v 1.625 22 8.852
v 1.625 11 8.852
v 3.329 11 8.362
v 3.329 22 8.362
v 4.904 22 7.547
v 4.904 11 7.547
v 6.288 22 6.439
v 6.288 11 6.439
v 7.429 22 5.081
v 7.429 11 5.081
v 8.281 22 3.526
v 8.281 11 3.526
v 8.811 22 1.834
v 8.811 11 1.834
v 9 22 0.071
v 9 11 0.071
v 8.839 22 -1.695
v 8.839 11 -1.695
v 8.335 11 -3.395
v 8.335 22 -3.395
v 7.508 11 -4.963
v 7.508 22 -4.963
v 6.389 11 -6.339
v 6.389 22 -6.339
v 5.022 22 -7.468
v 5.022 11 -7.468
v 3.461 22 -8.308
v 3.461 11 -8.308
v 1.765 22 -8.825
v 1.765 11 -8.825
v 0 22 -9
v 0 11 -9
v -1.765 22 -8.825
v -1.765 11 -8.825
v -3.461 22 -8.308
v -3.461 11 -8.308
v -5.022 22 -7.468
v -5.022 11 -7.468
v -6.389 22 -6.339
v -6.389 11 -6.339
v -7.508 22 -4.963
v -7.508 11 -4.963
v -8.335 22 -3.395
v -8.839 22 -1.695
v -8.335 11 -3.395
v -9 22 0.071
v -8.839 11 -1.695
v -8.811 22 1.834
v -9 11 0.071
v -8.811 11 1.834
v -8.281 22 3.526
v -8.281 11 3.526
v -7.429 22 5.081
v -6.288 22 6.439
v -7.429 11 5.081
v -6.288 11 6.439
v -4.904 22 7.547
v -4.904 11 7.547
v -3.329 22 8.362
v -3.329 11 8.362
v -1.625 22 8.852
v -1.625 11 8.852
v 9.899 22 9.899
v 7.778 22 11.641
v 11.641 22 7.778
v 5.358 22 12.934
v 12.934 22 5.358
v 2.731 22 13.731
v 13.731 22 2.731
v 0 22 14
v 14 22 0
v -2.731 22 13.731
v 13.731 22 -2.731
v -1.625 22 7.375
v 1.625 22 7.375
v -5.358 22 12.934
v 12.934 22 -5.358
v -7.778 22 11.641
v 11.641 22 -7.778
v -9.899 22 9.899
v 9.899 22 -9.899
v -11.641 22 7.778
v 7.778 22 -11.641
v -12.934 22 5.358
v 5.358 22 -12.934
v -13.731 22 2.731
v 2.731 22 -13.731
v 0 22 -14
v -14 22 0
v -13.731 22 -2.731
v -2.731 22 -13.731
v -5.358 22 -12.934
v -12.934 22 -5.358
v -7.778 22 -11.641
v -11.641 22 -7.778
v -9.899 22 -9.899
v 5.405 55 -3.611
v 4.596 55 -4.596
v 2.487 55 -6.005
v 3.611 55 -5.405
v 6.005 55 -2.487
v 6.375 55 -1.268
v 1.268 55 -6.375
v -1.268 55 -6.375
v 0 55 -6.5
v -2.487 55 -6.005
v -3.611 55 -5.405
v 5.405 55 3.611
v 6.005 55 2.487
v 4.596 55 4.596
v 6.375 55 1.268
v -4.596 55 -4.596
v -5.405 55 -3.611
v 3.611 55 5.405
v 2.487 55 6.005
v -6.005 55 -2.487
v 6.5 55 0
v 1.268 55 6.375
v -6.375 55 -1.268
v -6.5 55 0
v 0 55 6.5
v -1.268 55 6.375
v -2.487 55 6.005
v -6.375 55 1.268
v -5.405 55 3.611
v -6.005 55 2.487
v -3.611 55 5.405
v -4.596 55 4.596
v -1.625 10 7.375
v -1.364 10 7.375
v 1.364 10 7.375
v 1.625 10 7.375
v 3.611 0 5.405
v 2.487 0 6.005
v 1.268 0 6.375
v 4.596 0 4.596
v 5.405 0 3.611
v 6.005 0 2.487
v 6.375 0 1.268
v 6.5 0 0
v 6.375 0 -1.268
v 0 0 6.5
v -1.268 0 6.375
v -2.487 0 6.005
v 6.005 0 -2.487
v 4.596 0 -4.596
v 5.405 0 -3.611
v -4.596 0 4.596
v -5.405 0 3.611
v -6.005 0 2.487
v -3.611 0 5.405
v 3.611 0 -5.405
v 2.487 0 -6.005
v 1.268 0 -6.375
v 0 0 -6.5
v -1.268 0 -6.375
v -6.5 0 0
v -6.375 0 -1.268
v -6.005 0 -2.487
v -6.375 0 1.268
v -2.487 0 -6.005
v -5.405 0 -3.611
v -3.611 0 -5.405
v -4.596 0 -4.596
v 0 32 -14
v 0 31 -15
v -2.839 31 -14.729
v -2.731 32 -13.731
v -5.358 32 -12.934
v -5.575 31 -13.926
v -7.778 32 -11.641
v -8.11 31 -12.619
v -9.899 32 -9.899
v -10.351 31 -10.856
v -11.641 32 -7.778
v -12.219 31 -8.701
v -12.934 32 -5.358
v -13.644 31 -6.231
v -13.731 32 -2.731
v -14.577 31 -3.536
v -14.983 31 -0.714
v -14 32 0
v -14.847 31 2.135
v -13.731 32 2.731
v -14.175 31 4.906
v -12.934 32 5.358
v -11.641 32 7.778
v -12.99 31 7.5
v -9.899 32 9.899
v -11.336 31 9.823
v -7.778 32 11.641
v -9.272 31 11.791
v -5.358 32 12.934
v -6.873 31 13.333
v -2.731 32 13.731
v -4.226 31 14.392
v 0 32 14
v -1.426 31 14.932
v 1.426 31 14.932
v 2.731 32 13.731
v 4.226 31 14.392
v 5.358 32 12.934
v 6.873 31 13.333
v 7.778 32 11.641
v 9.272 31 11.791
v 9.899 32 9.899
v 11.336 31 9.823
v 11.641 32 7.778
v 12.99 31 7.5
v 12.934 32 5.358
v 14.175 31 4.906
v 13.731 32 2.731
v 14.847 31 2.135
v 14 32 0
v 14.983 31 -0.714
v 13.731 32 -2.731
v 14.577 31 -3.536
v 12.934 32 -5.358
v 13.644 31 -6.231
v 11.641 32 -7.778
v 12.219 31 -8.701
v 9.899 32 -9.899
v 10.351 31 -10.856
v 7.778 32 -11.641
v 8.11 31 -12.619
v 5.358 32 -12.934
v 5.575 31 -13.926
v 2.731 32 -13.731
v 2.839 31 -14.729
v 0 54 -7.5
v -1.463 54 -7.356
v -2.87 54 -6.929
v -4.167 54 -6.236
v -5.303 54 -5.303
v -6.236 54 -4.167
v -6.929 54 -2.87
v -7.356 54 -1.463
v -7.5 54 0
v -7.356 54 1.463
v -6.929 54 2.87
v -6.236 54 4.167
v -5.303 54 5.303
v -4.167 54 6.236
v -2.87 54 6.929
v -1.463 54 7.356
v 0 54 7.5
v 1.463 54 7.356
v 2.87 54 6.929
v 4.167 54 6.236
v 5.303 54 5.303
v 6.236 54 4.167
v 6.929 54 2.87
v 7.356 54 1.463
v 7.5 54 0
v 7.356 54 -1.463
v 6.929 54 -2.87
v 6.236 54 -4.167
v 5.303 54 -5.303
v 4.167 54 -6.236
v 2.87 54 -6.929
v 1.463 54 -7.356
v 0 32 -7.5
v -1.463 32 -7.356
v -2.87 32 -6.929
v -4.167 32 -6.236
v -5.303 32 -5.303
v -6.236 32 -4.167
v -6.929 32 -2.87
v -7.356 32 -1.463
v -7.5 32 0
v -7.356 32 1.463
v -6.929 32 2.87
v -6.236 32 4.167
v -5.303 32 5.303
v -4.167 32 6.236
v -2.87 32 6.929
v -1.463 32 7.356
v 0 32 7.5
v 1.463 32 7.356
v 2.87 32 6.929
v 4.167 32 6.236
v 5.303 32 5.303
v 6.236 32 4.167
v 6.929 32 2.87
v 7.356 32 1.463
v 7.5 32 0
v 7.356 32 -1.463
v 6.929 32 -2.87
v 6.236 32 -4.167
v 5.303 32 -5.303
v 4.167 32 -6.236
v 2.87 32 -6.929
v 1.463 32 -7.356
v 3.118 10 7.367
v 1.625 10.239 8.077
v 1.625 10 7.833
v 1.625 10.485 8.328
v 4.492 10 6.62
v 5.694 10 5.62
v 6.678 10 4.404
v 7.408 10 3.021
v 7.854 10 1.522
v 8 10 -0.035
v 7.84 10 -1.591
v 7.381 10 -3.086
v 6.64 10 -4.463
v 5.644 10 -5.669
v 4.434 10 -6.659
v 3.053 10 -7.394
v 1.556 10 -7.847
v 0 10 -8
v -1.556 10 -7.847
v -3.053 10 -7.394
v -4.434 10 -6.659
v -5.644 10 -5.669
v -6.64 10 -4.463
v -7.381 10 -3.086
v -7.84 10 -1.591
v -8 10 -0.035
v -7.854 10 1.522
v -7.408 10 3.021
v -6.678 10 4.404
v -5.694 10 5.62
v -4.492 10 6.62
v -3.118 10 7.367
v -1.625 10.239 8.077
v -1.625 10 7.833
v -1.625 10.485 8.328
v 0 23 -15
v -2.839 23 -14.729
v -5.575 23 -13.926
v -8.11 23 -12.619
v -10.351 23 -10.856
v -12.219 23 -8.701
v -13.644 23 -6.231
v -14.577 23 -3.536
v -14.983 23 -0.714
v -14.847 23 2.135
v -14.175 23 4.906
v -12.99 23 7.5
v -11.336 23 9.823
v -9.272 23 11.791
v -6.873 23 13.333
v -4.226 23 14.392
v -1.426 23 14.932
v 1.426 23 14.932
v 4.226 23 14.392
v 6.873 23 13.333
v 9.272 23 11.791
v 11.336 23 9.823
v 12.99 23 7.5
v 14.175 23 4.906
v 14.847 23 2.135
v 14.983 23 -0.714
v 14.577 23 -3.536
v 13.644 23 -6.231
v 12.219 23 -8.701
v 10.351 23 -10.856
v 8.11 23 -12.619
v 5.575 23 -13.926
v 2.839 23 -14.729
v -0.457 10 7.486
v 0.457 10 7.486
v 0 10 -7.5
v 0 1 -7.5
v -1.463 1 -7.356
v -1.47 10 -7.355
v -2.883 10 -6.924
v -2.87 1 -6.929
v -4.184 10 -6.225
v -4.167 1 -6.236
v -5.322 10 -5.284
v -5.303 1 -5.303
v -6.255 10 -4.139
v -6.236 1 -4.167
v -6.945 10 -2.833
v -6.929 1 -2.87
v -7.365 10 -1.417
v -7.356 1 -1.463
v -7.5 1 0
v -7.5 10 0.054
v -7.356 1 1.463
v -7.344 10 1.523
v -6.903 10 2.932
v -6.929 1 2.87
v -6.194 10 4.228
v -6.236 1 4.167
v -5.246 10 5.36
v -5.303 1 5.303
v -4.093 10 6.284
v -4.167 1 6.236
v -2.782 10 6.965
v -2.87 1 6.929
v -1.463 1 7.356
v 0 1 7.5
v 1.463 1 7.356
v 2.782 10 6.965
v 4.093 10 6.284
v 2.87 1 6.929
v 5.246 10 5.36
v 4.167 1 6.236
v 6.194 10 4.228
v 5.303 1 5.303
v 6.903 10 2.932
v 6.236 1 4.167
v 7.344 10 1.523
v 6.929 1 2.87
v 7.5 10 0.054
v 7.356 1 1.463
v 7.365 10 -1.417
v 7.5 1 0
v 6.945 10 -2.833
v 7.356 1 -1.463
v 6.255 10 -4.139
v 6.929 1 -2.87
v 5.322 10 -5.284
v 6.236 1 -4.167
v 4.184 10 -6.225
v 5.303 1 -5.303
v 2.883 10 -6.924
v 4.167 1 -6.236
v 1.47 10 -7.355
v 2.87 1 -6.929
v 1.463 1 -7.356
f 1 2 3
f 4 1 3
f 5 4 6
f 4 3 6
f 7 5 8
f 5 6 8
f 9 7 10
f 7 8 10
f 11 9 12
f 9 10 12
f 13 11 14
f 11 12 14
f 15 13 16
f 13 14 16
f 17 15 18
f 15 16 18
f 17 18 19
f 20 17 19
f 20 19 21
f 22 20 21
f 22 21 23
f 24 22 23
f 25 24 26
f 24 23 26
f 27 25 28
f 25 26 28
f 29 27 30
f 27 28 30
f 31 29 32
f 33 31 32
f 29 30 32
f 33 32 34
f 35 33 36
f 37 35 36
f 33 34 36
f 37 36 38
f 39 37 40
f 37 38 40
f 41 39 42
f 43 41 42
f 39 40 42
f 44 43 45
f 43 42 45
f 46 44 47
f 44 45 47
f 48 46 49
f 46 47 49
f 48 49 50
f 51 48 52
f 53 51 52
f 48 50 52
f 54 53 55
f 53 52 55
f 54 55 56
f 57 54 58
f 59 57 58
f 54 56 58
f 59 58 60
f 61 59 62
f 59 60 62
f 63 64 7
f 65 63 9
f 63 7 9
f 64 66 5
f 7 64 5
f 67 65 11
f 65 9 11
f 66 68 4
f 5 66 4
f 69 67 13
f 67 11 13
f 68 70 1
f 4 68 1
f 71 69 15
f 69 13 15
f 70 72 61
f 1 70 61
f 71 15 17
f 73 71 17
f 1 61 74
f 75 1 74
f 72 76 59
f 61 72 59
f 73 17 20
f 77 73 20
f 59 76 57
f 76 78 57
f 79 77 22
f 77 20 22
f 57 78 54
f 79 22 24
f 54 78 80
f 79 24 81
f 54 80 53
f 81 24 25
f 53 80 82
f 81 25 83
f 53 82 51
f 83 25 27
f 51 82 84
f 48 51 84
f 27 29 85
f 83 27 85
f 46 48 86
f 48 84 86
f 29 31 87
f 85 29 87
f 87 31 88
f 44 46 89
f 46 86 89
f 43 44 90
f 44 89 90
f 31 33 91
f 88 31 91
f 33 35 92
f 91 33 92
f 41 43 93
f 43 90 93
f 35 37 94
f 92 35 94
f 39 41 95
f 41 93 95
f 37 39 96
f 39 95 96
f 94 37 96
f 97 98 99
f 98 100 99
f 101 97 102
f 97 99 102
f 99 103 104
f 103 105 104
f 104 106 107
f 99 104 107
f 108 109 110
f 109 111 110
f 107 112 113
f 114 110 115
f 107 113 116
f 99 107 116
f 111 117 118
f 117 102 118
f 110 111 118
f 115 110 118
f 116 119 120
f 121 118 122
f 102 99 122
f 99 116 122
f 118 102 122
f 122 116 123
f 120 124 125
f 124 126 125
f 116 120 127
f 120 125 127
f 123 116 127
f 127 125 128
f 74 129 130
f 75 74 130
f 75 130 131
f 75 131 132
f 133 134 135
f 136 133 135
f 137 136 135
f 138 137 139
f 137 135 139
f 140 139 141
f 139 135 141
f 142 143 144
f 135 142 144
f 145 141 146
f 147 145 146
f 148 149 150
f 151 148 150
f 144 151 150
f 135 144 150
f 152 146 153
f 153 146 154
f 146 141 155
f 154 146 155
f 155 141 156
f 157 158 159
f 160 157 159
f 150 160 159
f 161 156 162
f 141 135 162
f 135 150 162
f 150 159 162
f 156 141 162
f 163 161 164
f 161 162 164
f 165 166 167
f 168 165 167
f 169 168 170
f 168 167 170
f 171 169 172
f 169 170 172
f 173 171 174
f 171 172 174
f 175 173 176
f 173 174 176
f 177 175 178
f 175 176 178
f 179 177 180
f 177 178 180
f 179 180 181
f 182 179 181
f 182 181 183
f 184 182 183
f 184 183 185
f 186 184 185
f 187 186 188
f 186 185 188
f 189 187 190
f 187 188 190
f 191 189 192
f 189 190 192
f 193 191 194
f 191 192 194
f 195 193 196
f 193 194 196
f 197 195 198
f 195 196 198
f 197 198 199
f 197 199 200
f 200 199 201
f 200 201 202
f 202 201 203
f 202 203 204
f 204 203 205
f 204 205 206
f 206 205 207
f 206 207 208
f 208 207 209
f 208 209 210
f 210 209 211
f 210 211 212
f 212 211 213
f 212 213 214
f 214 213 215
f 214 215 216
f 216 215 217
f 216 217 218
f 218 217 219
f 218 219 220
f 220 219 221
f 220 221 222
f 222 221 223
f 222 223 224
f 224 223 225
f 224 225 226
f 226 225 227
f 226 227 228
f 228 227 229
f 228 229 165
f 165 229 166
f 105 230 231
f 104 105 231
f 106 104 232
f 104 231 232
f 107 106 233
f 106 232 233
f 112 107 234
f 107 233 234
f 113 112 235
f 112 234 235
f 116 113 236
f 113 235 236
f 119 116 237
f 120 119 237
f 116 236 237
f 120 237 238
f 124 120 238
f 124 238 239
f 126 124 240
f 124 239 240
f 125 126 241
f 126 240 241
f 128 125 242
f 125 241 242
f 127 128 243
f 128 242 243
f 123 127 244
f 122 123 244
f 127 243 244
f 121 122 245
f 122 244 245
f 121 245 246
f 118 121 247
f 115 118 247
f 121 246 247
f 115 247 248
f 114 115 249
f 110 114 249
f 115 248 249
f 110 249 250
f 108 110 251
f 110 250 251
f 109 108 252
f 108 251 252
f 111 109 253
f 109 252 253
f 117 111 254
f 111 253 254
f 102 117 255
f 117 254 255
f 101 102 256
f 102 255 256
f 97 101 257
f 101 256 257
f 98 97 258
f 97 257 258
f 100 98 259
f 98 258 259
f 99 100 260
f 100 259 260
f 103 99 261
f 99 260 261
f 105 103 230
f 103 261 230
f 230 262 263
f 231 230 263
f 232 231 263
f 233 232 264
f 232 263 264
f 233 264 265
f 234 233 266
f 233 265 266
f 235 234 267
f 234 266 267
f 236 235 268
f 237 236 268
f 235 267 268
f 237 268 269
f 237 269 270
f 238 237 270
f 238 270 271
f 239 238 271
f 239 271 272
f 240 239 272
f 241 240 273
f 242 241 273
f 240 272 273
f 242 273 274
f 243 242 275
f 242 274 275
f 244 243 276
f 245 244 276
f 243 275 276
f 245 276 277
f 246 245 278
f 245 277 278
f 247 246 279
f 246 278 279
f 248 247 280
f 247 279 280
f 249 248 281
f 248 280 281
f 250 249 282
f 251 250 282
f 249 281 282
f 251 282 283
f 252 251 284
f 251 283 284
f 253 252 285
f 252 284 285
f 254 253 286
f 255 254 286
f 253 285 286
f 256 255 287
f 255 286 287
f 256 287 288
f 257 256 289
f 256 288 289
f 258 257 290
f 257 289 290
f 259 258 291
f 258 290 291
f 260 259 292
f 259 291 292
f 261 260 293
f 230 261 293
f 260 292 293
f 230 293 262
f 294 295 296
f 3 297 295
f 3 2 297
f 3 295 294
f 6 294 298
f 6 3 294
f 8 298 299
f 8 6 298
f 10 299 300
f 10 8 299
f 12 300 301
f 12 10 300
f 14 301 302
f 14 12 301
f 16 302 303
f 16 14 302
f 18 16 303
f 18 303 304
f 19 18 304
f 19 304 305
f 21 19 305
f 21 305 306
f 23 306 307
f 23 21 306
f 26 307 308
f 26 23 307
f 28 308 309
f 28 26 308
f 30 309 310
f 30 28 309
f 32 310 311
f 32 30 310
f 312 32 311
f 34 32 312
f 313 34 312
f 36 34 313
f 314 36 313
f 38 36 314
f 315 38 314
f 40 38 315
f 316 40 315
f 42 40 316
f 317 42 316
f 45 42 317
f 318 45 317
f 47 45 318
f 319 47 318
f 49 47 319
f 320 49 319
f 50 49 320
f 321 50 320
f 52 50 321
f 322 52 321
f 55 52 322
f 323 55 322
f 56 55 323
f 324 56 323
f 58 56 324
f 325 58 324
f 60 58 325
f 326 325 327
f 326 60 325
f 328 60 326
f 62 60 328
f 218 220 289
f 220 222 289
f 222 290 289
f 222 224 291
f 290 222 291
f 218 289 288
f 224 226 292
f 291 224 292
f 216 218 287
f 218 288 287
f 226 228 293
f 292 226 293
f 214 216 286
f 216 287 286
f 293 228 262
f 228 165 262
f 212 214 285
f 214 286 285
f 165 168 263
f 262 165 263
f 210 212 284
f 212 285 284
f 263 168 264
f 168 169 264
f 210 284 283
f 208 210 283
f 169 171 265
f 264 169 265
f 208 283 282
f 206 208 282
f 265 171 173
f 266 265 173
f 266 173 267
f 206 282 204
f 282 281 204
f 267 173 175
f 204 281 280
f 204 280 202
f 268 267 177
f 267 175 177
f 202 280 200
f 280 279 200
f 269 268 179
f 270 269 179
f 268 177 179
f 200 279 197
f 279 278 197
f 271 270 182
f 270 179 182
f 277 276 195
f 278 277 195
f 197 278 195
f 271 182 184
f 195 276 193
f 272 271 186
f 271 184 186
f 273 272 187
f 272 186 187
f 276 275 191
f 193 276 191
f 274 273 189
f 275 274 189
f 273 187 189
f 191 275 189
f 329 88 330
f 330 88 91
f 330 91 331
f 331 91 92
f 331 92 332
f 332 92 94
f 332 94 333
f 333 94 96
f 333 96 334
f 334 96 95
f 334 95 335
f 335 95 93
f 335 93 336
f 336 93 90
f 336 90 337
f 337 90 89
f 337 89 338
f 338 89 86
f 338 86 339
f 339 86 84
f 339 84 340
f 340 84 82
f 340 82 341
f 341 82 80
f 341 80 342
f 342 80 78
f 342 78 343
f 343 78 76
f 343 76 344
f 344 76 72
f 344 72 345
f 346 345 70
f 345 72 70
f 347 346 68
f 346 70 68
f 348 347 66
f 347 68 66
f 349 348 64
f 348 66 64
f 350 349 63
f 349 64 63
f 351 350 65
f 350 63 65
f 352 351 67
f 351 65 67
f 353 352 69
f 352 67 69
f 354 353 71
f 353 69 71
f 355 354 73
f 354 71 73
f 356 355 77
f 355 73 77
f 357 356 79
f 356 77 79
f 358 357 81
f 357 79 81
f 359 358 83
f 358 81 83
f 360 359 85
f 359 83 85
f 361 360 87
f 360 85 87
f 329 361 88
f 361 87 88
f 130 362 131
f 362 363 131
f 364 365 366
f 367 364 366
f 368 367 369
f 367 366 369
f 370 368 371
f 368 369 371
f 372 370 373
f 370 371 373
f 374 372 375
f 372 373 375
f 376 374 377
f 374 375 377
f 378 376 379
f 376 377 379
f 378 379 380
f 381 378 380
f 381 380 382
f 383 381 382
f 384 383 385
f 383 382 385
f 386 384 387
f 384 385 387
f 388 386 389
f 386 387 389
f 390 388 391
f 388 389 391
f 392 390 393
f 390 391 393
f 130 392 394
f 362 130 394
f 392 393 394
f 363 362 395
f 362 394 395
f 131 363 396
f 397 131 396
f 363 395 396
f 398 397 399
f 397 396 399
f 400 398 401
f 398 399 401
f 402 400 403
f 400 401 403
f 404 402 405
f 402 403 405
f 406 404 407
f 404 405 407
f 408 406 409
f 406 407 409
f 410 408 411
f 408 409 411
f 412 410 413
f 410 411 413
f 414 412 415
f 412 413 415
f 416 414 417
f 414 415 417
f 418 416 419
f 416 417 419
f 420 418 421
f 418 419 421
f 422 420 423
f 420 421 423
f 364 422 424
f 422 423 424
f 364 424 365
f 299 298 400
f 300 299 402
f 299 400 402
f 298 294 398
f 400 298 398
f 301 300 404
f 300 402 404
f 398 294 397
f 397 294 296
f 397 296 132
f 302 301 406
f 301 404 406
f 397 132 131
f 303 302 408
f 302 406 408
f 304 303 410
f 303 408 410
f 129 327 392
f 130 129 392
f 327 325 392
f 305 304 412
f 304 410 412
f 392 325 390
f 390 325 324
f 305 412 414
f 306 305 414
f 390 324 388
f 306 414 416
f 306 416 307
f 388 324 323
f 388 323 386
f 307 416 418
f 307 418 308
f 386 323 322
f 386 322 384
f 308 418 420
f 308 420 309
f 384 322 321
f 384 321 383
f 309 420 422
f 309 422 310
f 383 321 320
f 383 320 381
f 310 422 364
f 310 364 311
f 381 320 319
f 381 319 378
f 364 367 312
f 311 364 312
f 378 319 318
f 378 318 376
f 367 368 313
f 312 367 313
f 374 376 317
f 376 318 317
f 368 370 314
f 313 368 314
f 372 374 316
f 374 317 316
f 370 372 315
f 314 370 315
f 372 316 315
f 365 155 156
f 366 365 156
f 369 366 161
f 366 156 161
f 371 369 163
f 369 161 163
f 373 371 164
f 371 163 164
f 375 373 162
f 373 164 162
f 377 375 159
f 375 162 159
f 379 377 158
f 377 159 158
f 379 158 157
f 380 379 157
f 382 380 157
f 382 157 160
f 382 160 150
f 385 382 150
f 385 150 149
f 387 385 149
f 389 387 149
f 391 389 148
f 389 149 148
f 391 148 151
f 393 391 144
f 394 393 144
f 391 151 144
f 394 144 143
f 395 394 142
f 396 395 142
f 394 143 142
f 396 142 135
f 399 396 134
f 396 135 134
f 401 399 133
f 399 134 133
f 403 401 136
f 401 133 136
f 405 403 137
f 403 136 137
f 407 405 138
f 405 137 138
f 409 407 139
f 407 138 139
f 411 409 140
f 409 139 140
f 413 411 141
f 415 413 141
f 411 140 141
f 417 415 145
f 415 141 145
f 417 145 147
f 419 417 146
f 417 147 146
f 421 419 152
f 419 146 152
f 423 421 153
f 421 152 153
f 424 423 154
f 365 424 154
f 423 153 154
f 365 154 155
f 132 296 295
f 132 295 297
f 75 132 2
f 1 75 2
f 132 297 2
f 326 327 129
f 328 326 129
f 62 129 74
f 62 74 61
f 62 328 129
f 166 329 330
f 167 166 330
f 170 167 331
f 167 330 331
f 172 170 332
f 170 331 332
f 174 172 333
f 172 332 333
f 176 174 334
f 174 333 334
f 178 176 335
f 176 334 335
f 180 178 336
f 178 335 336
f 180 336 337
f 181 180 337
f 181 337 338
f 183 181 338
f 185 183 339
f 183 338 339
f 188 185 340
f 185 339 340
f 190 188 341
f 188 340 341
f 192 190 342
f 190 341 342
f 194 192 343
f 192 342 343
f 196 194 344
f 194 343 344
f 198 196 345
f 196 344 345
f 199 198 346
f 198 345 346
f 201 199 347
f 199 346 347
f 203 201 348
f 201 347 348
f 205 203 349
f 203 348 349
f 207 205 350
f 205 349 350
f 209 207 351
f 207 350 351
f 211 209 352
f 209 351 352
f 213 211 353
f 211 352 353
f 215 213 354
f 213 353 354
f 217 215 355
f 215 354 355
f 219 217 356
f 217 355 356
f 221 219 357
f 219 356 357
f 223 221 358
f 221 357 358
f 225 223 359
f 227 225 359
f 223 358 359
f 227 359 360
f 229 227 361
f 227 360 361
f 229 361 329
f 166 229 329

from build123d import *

# Parameters (mm, degrees)
SKETCH2_W          = 3.25
SKETCH2_H          = 3.25
CUT_EXTRUDE1_DEPTH = 12
CHAMFER1_SIZE      = 1


with BuildPart() as part:
    # Sketch1 → Revolve1 (revolve)
    with BuildSketch(Plane.XY, mode=Mode.PRIVATE) as revolve1_sk:
        Polygon((0, 0), (0, 55), (7.5, 55), (7.5, 32), (15, 32), (15, 22), (9, 22), (9, 10), (7.5, 10), (7.5, 0), align=None)
    revolve(revolve1_sk.sketch.rotate(Axis((0, 0, 0), (0, 1, 0)), 90), axis=Axis((0, 0, 0), (0, 1, 0)))

    # Sketch2 → Cut-Extrude1 (cut)
    with BuildSketch(Plane.XZ.offset(-10)):
        with Locations((0, 9)):
            Rectangle(SKETCH2_W, SKETCH2_H)
    extrude(amount=-CUT_EXTRUDE1_DEPTH, mode=Mode.SUBTRACT)

    # Chamfer1
    chamfer1_edges = [part.edges().sort_by_distance(p)[0] for p in [
        (0, 55, 7.5),
        (0, 10, -9),
        (0, 0, 7.5),
        (0, 22, 15),
        (0, 32, 15),
    ]]
    chamfer(chamfer1_edges, length=CHAMFER1_SIZE)


solid = part.part
